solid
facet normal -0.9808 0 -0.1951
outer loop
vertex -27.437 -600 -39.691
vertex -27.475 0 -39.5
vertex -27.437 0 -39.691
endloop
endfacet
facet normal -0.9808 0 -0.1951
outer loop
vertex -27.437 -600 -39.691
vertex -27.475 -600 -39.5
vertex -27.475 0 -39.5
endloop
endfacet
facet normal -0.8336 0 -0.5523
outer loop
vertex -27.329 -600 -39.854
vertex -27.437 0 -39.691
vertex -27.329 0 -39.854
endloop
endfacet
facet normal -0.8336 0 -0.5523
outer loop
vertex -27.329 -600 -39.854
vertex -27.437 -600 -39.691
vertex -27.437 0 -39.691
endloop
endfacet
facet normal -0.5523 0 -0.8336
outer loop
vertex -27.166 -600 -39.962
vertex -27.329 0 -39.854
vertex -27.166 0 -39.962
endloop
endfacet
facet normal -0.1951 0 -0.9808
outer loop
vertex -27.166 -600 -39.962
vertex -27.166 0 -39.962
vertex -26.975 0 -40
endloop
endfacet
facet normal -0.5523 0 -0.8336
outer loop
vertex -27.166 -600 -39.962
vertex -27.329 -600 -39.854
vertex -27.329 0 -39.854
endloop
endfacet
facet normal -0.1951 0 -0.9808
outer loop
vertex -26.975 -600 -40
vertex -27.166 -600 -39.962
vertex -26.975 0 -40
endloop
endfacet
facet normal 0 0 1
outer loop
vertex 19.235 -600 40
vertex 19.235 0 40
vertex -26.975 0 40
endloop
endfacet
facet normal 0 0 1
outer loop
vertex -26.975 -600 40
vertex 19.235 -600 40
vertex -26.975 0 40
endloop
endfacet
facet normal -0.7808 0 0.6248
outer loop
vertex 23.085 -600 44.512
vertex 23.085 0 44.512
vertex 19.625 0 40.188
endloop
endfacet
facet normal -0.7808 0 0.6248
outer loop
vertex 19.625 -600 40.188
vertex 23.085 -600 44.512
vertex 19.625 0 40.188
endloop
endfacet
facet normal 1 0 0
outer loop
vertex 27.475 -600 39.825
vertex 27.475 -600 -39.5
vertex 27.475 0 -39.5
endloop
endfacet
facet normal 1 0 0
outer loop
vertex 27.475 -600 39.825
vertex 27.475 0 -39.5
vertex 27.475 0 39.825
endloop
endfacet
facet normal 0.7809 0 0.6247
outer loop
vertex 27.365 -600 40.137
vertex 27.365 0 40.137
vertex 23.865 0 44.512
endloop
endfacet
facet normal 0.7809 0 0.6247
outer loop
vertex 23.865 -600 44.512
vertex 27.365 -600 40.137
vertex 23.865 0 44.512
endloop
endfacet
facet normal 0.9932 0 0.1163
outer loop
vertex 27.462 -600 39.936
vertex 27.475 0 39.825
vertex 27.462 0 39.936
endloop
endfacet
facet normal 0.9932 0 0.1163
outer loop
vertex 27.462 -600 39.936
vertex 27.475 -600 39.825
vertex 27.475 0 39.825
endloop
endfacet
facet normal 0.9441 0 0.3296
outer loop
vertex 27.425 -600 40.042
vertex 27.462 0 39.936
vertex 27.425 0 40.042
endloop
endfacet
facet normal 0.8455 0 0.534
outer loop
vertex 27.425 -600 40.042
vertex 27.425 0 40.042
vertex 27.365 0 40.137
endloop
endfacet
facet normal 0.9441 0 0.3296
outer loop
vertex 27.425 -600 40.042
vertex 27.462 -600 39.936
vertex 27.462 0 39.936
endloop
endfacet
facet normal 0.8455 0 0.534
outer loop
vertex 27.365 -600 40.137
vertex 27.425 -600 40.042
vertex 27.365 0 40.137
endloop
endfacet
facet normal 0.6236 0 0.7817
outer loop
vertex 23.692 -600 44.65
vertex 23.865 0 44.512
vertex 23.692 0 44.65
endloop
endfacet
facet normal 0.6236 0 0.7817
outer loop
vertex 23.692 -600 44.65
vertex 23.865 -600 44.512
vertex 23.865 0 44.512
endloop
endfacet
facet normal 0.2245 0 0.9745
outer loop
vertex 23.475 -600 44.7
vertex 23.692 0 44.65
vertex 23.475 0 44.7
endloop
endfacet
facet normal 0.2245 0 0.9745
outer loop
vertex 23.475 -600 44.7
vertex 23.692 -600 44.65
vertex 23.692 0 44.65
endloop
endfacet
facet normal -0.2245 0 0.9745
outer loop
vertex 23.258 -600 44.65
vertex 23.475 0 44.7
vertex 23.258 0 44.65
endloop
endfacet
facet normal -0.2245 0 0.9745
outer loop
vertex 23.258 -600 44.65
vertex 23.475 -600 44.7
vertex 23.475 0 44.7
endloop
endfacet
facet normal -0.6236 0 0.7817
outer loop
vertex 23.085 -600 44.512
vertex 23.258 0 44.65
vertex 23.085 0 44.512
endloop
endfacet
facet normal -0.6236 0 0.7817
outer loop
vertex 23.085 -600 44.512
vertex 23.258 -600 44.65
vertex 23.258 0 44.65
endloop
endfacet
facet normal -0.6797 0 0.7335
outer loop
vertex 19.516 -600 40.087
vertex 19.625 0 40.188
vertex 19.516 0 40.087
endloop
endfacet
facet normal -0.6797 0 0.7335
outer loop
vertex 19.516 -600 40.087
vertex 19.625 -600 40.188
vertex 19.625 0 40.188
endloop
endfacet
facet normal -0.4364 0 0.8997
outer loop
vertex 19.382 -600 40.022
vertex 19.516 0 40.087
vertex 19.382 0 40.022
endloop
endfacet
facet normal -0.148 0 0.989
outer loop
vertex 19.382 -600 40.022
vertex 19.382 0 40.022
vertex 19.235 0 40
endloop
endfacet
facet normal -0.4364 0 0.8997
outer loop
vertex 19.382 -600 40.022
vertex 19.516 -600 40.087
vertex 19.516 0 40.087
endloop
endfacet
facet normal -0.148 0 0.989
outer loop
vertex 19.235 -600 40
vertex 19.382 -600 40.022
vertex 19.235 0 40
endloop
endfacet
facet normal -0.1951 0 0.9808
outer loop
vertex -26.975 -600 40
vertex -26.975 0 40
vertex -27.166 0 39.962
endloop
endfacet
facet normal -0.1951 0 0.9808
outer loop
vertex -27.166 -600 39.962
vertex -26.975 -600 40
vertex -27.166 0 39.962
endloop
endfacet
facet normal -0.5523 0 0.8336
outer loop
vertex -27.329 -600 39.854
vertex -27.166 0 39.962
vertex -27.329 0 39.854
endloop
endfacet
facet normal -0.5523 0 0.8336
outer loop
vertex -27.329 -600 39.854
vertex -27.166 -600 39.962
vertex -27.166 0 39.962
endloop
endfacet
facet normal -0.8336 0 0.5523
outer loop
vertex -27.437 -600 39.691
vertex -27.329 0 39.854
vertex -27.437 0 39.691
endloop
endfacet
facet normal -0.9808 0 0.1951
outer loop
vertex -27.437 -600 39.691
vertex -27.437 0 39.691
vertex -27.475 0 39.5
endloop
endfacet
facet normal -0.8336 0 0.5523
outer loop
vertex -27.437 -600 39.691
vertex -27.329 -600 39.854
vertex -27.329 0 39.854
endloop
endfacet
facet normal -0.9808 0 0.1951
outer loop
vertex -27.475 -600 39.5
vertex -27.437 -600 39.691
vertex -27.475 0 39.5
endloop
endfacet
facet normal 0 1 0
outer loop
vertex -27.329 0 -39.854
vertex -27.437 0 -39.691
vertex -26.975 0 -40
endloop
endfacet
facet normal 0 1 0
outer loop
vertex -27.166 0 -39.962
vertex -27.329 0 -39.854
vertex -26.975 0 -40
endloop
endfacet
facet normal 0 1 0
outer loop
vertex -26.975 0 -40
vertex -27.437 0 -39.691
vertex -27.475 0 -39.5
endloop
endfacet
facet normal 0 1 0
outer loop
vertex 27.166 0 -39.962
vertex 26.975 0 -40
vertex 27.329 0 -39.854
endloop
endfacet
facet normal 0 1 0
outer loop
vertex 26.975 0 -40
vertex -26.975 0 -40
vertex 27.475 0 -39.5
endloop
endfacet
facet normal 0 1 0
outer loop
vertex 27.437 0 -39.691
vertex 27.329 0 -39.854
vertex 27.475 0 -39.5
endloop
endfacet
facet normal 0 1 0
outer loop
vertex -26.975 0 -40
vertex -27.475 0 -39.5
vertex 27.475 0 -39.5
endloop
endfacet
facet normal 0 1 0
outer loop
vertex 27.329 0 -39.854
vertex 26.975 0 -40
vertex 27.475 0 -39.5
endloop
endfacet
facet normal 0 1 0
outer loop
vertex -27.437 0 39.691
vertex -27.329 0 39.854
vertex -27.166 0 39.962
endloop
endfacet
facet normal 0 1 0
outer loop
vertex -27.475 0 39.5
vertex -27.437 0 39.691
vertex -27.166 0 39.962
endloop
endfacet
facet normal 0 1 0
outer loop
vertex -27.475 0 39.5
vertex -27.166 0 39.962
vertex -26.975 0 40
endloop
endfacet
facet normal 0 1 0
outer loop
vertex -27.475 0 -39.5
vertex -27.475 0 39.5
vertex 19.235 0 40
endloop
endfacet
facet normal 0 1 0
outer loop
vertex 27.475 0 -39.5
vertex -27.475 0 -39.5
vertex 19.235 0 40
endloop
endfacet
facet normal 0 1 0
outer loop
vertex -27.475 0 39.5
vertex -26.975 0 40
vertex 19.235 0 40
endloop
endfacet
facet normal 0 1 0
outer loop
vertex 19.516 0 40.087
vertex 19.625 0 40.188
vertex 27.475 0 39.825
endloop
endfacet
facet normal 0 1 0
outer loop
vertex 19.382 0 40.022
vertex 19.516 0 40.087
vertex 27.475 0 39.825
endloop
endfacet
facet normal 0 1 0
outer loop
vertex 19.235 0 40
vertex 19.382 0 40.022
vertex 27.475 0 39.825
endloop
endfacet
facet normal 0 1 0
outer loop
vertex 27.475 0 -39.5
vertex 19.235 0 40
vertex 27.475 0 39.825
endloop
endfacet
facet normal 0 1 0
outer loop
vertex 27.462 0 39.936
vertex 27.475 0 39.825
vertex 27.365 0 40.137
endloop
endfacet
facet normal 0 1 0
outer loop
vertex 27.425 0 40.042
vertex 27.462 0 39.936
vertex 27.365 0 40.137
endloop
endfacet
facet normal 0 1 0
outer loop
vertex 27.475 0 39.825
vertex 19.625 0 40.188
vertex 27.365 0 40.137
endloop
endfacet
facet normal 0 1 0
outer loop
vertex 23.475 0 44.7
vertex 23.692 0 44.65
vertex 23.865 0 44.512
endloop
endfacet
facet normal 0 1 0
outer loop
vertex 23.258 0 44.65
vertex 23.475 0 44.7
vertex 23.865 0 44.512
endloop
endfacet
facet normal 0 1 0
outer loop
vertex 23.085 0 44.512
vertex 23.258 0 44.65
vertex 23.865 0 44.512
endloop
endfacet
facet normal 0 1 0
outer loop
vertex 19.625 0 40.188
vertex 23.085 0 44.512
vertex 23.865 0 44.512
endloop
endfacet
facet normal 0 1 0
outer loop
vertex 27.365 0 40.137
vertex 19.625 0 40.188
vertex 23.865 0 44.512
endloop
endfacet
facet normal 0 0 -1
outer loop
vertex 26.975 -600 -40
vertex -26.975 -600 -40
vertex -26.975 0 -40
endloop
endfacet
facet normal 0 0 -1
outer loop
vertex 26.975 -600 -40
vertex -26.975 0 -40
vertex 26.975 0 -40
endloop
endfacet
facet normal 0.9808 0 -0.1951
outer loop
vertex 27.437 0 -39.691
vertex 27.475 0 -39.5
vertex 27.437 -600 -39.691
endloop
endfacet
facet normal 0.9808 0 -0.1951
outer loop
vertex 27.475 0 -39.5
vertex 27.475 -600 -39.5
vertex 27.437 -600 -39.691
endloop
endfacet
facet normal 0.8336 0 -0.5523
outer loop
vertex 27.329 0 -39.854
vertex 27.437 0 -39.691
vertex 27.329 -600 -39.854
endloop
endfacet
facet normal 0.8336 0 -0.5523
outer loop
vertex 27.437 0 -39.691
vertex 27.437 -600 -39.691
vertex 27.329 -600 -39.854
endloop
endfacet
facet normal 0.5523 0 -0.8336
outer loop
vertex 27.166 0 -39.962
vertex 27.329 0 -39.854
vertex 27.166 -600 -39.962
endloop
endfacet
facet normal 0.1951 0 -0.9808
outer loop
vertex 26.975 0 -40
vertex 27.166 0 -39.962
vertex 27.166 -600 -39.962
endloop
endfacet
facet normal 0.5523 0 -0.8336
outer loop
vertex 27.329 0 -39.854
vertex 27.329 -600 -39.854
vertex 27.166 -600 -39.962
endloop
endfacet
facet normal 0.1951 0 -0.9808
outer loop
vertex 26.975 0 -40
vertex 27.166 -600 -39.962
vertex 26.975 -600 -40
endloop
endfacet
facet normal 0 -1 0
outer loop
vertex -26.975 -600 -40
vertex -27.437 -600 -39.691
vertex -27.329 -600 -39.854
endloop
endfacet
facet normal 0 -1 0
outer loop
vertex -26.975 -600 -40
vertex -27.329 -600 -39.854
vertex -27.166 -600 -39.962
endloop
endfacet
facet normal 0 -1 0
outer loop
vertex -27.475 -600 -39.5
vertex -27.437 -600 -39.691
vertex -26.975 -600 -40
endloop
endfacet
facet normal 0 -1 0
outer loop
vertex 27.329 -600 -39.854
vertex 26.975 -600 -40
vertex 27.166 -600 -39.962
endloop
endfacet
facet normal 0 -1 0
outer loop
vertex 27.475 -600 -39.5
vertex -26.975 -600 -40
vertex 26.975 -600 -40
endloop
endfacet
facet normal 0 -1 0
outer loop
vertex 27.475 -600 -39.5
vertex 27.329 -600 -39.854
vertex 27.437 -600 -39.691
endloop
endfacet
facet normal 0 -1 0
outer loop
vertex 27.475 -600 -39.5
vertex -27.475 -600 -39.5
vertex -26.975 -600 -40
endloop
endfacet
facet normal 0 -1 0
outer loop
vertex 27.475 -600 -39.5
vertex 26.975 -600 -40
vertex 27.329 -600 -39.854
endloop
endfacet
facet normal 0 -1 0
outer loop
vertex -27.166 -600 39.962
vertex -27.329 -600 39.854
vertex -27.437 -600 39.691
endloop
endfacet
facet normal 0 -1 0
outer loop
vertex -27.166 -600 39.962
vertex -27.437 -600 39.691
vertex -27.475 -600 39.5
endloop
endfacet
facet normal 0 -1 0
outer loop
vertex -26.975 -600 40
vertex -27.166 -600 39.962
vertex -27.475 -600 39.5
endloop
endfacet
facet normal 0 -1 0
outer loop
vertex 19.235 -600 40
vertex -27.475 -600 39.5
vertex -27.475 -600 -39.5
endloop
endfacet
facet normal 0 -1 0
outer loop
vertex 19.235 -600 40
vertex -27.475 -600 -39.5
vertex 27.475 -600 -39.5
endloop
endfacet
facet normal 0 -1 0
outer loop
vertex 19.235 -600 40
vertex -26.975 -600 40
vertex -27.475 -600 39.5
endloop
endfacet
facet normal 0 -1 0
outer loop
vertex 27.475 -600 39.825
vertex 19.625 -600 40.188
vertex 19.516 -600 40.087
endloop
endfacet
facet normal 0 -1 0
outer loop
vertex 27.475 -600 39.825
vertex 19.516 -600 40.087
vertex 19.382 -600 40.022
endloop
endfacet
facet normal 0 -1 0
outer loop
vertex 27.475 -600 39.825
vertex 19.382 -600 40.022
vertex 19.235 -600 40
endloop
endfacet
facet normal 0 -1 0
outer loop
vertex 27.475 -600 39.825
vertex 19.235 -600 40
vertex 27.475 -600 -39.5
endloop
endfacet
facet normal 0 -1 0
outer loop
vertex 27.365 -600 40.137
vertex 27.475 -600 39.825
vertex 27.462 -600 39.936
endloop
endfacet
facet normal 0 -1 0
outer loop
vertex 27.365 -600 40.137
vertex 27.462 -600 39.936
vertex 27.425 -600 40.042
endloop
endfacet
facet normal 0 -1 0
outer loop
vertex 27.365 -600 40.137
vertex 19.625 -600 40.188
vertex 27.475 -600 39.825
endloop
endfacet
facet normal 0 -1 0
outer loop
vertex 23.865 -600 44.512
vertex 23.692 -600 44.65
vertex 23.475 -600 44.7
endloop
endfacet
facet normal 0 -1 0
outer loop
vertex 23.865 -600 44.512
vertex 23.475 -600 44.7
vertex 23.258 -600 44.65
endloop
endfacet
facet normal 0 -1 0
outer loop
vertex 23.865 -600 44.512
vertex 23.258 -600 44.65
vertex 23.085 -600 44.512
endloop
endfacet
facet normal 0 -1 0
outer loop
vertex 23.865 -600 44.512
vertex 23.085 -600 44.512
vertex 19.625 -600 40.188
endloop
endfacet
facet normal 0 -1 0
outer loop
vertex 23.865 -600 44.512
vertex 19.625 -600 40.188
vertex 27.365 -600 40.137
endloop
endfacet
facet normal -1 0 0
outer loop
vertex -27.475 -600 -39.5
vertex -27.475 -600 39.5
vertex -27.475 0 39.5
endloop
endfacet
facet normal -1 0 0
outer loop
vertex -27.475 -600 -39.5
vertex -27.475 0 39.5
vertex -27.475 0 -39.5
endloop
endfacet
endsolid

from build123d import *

# Parameters (mm, degrees)
F1_DEPTH = 600
F2_R     = 0.5


with BuildPart() as f1:
    # F0 (on Front) → F1 (new body)
    with BuildSketch(Plane.XZ):
        Polygon((27.475, -40), (27.475, 40), (19.475, 40), (-27.475, 40), (-27.475, -40), align=None)
        Polygon((19.475, 40), (27.475, 40), (23.475, 45), align=None)
    extrude(amount=F1_DEPTH)

    # F2
    f2_edges = [f1.edges().sort_by_distance(p)[0] for p in [
        (23.475, -300, 45),
        (27.475, -300, 40),
        (19.475, -300, 40),
        (-27.475, -300, 40),
        (-27.475, -300, -40),
        (27.475, -300, -40),
    ]]
    fillet(f2_edges, radius=F2_R)


solid = f1.part
